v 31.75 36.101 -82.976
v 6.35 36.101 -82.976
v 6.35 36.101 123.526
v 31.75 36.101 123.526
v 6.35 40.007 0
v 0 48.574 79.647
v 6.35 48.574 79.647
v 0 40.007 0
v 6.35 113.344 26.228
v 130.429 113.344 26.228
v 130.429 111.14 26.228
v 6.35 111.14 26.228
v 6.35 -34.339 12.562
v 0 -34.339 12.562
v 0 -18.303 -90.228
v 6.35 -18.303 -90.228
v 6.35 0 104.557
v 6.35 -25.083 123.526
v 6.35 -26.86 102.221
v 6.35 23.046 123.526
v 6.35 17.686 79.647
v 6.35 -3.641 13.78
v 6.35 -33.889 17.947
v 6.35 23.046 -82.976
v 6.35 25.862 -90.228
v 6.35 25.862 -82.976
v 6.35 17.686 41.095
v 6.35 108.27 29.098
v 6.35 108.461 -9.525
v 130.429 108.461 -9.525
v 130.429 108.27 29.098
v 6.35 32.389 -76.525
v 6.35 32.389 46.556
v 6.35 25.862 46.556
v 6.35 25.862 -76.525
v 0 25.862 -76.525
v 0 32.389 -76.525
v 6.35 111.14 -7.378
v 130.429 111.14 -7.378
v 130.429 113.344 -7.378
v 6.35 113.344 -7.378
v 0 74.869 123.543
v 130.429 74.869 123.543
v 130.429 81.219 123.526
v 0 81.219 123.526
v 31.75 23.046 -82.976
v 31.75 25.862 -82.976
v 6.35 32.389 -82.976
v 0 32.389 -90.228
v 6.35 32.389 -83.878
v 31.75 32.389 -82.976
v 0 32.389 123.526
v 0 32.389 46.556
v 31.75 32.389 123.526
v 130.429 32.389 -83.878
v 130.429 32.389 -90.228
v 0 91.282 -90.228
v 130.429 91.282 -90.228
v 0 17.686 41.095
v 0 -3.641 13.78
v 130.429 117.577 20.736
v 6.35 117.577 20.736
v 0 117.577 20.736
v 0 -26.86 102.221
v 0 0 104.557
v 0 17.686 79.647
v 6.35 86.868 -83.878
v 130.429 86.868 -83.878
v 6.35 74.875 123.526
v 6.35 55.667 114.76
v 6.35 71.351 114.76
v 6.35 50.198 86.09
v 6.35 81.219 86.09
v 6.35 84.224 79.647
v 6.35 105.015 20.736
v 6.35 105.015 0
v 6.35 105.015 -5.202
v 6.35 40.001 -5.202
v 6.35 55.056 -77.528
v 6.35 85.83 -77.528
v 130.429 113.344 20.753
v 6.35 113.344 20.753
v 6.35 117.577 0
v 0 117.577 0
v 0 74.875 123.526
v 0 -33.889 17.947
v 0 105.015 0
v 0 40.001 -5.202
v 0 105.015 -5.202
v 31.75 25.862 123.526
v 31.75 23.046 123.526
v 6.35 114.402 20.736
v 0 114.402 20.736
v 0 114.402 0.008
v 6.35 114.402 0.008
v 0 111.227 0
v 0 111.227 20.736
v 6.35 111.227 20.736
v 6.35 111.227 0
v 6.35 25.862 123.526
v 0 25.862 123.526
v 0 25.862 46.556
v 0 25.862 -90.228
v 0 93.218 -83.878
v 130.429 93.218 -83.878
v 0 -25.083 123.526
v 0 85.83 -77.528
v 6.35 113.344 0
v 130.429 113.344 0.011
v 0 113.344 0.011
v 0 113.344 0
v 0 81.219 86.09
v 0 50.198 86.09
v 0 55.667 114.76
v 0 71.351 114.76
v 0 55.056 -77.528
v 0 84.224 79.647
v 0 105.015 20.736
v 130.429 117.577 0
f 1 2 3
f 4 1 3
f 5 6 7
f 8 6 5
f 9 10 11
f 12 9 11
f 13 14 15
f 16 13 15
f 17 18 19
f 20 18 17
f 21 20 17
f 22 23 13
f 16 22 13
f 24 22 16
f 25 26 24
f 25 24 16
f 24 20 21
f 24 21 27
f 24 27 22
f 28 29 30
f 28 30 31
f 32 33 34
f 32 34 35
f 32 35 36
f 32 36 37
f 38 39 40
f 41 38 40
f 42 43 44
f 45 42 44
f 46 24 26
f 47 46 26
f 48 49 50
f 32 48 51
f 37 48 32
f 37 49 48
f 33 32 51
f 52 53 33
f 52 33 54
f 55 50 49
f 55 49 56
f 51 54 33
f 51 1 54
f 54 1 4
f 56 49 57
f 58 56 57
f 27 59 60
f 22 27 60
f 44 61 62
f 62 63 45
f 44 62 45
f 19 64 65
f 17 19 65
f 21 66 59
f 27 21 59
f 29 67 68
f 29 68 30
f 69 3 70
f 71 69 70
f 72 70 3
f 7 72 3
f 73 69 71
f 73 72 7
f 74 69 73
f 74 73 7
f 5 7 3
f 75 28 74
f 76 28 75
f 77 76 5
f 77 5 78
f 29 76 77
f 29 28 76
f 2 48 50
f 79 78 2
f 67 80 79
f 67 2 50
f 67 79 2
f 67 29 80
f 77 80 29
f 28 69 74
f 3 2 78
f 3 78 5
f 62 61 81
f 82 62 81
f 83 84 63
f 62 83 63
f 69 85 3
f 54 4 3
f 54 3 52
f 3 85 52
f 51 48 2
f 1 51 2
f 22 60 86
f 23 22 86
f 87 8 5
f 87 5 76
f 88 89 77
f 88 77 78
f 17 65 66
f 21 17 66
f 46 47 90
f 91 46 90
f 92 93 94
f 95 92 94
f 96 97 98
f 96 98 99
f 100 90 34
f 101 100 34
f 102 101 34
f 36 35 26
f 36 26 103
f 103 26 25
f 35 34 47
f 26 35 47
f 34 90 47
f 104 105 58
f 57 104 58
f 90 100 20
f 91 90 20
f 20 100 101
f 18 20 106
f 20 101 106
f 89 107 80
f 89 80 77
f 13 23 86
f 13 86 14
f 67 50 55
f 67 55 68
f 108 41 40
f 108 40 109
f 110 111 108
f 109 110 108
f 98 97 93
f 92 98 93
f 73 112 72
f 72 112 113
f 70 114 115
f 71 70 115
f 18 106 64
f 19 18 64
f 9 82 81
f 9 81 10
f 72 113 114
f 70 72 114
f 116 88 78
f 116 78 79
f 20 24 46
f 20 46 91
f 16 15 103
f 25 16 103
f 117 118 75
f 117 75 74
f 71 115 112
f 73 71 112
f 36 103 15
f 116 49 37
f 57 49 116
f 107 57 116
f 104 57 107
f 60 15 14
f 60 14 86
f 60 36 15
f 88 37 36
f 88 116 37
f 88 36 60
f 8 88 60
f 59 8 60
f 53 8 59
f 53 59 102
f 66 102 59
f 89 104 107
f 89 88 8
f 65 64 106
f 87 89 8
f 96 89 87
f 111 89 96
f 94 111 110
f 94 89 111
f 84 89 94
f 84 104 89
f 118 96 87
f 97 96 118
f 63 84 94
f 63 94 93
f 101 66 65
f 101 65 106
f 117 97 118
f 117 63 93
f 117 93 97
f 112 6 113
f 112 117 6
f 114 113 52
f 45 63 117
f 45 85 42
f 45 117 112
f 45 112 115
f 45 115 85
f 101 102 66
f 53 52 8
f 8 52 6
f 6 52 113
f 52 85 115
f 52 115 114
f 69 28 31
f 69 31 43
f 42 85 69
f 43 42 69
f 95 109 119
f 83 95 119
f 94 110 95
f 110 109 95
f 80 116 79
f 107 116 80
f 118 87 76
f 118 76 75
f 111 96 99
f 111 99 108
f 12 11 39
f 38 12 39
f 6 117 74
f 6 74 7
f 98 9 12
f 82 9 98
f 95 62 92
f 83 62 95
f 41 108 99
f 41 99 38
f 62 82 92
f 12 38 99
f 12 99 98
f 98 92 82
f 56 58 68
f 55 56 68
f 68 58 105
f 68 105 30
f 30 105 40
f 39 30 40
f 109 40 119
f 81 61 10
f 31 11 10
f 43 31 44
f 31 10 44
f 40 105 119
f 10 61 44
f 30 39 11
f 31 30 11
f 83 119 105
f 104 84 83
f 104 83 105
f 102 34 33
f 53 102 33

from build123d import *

# Parameters (mm, degrees)
SKETCH1_W           = 20.735936364
SKETCH1_H           = 3.175
BOSS_EXTRUDE1_DEPTH = 6.35
SKETCH2_W           = 82.651107169
SKETCH2_H           = 6.52720724
SKETCH2_W_2         = 76.969823319
SKETCH2_H_2         = 6.604
CUT_EXTRUDE1_DEPTH  = 7.35
SKETCH6_W           = 206.502
SKETCH6_H           = 3.711703494
SKETCH6_H_2         = 2.816288331
BOSS_EXTRUDE3_DEPTH = 31.75
BOSS_EXTRUDE5_DEPTH = 130.429


with BuildPart() as part:
    # Sketch1 → Boss-Extrude1 (new body)
    with BuildSketch(Plane(origin=(0, 0, 0), x_dir=(0, 0, -1), z_dir=(1, 0, 0))):
        Polygon((-123.525645009, 81.218983384), (-123.525645009, -25.082949612), (-102.22101814, -26.860004783), (-104.557017494, 0), (-79.646789796, 17.686261666), (-41.094549164, 17.686261666), (-13.779824281, -3.641289166), (-17.947471695, -33.889404663), (-12.561862574, -34.338627482), (90.228248196, -18.303088648), (90.228248196, 91.281577209), (0, 117.577378193), (-20.735936364, 117.577378193), align=None)
        Polygon((5.201841666, 40.001048477), (77.528248196, 55.056292197), (77.528248196, 85.830387495), (5.201841666, 105.015188817), align=None, mode=Mode.SUBTRACT)
        Polygon((-79.646789796, 84.224142025), (-79.646789796, 48.574048336), (0, 40.007327233), (0, 105.015188817), (-20.735936364, 105.015188817), align=None, mode=Mode.SUBTRACT)
        Polygon((-86.090479579, 81.218983384), (-86.090479579, 50.197772081), (-114.759972161, 55.666680192), (-114.759972161, 71.350976637), align=None, mode=Mode.SUBTRACT)
        with Locations((-10.367968182, 112.814878193)):
            Rectangle(SKETCH1_W, SKETCH1_H, mode=Mode.SUBTRACT)
    extrude(amount=BOSS_EXTRUDE1_DEPTH)

    # Sketch2 → Cut-Extrude1 (cut, through all)
    with BuildSketch(Plane(origin=(6.35, 0, 0), x_dir=(0, 0, -1), z_dir=(1, 0, 0))):
        with Locations((117.850801407, 29.125465717)):
            Rectangle(SKETCH2_W, SKETCH2_H)
        with Locations((-85.04073335, 29.163862097)):
            Rectangle(SKETCH2_W_2, SKETCH2_H_2)
    extrude(amount=-CUT_EXTRUDE1_DEPTH, mode=Mode.SUBTRACT)

    # Sketch6 → Boss-Extrude3 (add)
    with BuildSketch(Plane.ZY):
        with Locations((20.274645009, 34.244921084)):
            Rectangle(SKETCH6_W, SKETCH6_H)
        with Locations((20.274645009, 24.453717932)):
            Rectangle(SKETCH6_W, SKETCH6_H_2)
    extrude(amount=-BOSS_EXTRUDE3_DEPTH)

    # Sketch8 → Boss-Extrude5 (add)
    with BuildSketch(Plane.ZY):
        Polygon((0, 117.577378193), (-83.878248196, 93.218298083), (-90.228248196, 91.281577209), (-90.228248196, 32.389069337), (-83.878248196, 32.389069337), (-83.878248196, 86.868298083), (-9.525197863, 108.461165703), (29.097772116, 108.270149457), (123.542635704, 74.868983384), (123.525645009, 81.218983384), (20.735936364, 117.577378193), (20.752927059, 113.344232588), (26.228286967, 113.344232588), (26.228286967, 111.139694939), (20.752927059, 111.139694939), (0.016990695, 111.139694939), (-7.377605414, 111.139694939), (-7.377605414, 113.344232588), (0.011172356, 113.344232588), align=None)
    extrude(amount=-BOSS_EXTRUDE5_DEPTH)


solid = part.part
